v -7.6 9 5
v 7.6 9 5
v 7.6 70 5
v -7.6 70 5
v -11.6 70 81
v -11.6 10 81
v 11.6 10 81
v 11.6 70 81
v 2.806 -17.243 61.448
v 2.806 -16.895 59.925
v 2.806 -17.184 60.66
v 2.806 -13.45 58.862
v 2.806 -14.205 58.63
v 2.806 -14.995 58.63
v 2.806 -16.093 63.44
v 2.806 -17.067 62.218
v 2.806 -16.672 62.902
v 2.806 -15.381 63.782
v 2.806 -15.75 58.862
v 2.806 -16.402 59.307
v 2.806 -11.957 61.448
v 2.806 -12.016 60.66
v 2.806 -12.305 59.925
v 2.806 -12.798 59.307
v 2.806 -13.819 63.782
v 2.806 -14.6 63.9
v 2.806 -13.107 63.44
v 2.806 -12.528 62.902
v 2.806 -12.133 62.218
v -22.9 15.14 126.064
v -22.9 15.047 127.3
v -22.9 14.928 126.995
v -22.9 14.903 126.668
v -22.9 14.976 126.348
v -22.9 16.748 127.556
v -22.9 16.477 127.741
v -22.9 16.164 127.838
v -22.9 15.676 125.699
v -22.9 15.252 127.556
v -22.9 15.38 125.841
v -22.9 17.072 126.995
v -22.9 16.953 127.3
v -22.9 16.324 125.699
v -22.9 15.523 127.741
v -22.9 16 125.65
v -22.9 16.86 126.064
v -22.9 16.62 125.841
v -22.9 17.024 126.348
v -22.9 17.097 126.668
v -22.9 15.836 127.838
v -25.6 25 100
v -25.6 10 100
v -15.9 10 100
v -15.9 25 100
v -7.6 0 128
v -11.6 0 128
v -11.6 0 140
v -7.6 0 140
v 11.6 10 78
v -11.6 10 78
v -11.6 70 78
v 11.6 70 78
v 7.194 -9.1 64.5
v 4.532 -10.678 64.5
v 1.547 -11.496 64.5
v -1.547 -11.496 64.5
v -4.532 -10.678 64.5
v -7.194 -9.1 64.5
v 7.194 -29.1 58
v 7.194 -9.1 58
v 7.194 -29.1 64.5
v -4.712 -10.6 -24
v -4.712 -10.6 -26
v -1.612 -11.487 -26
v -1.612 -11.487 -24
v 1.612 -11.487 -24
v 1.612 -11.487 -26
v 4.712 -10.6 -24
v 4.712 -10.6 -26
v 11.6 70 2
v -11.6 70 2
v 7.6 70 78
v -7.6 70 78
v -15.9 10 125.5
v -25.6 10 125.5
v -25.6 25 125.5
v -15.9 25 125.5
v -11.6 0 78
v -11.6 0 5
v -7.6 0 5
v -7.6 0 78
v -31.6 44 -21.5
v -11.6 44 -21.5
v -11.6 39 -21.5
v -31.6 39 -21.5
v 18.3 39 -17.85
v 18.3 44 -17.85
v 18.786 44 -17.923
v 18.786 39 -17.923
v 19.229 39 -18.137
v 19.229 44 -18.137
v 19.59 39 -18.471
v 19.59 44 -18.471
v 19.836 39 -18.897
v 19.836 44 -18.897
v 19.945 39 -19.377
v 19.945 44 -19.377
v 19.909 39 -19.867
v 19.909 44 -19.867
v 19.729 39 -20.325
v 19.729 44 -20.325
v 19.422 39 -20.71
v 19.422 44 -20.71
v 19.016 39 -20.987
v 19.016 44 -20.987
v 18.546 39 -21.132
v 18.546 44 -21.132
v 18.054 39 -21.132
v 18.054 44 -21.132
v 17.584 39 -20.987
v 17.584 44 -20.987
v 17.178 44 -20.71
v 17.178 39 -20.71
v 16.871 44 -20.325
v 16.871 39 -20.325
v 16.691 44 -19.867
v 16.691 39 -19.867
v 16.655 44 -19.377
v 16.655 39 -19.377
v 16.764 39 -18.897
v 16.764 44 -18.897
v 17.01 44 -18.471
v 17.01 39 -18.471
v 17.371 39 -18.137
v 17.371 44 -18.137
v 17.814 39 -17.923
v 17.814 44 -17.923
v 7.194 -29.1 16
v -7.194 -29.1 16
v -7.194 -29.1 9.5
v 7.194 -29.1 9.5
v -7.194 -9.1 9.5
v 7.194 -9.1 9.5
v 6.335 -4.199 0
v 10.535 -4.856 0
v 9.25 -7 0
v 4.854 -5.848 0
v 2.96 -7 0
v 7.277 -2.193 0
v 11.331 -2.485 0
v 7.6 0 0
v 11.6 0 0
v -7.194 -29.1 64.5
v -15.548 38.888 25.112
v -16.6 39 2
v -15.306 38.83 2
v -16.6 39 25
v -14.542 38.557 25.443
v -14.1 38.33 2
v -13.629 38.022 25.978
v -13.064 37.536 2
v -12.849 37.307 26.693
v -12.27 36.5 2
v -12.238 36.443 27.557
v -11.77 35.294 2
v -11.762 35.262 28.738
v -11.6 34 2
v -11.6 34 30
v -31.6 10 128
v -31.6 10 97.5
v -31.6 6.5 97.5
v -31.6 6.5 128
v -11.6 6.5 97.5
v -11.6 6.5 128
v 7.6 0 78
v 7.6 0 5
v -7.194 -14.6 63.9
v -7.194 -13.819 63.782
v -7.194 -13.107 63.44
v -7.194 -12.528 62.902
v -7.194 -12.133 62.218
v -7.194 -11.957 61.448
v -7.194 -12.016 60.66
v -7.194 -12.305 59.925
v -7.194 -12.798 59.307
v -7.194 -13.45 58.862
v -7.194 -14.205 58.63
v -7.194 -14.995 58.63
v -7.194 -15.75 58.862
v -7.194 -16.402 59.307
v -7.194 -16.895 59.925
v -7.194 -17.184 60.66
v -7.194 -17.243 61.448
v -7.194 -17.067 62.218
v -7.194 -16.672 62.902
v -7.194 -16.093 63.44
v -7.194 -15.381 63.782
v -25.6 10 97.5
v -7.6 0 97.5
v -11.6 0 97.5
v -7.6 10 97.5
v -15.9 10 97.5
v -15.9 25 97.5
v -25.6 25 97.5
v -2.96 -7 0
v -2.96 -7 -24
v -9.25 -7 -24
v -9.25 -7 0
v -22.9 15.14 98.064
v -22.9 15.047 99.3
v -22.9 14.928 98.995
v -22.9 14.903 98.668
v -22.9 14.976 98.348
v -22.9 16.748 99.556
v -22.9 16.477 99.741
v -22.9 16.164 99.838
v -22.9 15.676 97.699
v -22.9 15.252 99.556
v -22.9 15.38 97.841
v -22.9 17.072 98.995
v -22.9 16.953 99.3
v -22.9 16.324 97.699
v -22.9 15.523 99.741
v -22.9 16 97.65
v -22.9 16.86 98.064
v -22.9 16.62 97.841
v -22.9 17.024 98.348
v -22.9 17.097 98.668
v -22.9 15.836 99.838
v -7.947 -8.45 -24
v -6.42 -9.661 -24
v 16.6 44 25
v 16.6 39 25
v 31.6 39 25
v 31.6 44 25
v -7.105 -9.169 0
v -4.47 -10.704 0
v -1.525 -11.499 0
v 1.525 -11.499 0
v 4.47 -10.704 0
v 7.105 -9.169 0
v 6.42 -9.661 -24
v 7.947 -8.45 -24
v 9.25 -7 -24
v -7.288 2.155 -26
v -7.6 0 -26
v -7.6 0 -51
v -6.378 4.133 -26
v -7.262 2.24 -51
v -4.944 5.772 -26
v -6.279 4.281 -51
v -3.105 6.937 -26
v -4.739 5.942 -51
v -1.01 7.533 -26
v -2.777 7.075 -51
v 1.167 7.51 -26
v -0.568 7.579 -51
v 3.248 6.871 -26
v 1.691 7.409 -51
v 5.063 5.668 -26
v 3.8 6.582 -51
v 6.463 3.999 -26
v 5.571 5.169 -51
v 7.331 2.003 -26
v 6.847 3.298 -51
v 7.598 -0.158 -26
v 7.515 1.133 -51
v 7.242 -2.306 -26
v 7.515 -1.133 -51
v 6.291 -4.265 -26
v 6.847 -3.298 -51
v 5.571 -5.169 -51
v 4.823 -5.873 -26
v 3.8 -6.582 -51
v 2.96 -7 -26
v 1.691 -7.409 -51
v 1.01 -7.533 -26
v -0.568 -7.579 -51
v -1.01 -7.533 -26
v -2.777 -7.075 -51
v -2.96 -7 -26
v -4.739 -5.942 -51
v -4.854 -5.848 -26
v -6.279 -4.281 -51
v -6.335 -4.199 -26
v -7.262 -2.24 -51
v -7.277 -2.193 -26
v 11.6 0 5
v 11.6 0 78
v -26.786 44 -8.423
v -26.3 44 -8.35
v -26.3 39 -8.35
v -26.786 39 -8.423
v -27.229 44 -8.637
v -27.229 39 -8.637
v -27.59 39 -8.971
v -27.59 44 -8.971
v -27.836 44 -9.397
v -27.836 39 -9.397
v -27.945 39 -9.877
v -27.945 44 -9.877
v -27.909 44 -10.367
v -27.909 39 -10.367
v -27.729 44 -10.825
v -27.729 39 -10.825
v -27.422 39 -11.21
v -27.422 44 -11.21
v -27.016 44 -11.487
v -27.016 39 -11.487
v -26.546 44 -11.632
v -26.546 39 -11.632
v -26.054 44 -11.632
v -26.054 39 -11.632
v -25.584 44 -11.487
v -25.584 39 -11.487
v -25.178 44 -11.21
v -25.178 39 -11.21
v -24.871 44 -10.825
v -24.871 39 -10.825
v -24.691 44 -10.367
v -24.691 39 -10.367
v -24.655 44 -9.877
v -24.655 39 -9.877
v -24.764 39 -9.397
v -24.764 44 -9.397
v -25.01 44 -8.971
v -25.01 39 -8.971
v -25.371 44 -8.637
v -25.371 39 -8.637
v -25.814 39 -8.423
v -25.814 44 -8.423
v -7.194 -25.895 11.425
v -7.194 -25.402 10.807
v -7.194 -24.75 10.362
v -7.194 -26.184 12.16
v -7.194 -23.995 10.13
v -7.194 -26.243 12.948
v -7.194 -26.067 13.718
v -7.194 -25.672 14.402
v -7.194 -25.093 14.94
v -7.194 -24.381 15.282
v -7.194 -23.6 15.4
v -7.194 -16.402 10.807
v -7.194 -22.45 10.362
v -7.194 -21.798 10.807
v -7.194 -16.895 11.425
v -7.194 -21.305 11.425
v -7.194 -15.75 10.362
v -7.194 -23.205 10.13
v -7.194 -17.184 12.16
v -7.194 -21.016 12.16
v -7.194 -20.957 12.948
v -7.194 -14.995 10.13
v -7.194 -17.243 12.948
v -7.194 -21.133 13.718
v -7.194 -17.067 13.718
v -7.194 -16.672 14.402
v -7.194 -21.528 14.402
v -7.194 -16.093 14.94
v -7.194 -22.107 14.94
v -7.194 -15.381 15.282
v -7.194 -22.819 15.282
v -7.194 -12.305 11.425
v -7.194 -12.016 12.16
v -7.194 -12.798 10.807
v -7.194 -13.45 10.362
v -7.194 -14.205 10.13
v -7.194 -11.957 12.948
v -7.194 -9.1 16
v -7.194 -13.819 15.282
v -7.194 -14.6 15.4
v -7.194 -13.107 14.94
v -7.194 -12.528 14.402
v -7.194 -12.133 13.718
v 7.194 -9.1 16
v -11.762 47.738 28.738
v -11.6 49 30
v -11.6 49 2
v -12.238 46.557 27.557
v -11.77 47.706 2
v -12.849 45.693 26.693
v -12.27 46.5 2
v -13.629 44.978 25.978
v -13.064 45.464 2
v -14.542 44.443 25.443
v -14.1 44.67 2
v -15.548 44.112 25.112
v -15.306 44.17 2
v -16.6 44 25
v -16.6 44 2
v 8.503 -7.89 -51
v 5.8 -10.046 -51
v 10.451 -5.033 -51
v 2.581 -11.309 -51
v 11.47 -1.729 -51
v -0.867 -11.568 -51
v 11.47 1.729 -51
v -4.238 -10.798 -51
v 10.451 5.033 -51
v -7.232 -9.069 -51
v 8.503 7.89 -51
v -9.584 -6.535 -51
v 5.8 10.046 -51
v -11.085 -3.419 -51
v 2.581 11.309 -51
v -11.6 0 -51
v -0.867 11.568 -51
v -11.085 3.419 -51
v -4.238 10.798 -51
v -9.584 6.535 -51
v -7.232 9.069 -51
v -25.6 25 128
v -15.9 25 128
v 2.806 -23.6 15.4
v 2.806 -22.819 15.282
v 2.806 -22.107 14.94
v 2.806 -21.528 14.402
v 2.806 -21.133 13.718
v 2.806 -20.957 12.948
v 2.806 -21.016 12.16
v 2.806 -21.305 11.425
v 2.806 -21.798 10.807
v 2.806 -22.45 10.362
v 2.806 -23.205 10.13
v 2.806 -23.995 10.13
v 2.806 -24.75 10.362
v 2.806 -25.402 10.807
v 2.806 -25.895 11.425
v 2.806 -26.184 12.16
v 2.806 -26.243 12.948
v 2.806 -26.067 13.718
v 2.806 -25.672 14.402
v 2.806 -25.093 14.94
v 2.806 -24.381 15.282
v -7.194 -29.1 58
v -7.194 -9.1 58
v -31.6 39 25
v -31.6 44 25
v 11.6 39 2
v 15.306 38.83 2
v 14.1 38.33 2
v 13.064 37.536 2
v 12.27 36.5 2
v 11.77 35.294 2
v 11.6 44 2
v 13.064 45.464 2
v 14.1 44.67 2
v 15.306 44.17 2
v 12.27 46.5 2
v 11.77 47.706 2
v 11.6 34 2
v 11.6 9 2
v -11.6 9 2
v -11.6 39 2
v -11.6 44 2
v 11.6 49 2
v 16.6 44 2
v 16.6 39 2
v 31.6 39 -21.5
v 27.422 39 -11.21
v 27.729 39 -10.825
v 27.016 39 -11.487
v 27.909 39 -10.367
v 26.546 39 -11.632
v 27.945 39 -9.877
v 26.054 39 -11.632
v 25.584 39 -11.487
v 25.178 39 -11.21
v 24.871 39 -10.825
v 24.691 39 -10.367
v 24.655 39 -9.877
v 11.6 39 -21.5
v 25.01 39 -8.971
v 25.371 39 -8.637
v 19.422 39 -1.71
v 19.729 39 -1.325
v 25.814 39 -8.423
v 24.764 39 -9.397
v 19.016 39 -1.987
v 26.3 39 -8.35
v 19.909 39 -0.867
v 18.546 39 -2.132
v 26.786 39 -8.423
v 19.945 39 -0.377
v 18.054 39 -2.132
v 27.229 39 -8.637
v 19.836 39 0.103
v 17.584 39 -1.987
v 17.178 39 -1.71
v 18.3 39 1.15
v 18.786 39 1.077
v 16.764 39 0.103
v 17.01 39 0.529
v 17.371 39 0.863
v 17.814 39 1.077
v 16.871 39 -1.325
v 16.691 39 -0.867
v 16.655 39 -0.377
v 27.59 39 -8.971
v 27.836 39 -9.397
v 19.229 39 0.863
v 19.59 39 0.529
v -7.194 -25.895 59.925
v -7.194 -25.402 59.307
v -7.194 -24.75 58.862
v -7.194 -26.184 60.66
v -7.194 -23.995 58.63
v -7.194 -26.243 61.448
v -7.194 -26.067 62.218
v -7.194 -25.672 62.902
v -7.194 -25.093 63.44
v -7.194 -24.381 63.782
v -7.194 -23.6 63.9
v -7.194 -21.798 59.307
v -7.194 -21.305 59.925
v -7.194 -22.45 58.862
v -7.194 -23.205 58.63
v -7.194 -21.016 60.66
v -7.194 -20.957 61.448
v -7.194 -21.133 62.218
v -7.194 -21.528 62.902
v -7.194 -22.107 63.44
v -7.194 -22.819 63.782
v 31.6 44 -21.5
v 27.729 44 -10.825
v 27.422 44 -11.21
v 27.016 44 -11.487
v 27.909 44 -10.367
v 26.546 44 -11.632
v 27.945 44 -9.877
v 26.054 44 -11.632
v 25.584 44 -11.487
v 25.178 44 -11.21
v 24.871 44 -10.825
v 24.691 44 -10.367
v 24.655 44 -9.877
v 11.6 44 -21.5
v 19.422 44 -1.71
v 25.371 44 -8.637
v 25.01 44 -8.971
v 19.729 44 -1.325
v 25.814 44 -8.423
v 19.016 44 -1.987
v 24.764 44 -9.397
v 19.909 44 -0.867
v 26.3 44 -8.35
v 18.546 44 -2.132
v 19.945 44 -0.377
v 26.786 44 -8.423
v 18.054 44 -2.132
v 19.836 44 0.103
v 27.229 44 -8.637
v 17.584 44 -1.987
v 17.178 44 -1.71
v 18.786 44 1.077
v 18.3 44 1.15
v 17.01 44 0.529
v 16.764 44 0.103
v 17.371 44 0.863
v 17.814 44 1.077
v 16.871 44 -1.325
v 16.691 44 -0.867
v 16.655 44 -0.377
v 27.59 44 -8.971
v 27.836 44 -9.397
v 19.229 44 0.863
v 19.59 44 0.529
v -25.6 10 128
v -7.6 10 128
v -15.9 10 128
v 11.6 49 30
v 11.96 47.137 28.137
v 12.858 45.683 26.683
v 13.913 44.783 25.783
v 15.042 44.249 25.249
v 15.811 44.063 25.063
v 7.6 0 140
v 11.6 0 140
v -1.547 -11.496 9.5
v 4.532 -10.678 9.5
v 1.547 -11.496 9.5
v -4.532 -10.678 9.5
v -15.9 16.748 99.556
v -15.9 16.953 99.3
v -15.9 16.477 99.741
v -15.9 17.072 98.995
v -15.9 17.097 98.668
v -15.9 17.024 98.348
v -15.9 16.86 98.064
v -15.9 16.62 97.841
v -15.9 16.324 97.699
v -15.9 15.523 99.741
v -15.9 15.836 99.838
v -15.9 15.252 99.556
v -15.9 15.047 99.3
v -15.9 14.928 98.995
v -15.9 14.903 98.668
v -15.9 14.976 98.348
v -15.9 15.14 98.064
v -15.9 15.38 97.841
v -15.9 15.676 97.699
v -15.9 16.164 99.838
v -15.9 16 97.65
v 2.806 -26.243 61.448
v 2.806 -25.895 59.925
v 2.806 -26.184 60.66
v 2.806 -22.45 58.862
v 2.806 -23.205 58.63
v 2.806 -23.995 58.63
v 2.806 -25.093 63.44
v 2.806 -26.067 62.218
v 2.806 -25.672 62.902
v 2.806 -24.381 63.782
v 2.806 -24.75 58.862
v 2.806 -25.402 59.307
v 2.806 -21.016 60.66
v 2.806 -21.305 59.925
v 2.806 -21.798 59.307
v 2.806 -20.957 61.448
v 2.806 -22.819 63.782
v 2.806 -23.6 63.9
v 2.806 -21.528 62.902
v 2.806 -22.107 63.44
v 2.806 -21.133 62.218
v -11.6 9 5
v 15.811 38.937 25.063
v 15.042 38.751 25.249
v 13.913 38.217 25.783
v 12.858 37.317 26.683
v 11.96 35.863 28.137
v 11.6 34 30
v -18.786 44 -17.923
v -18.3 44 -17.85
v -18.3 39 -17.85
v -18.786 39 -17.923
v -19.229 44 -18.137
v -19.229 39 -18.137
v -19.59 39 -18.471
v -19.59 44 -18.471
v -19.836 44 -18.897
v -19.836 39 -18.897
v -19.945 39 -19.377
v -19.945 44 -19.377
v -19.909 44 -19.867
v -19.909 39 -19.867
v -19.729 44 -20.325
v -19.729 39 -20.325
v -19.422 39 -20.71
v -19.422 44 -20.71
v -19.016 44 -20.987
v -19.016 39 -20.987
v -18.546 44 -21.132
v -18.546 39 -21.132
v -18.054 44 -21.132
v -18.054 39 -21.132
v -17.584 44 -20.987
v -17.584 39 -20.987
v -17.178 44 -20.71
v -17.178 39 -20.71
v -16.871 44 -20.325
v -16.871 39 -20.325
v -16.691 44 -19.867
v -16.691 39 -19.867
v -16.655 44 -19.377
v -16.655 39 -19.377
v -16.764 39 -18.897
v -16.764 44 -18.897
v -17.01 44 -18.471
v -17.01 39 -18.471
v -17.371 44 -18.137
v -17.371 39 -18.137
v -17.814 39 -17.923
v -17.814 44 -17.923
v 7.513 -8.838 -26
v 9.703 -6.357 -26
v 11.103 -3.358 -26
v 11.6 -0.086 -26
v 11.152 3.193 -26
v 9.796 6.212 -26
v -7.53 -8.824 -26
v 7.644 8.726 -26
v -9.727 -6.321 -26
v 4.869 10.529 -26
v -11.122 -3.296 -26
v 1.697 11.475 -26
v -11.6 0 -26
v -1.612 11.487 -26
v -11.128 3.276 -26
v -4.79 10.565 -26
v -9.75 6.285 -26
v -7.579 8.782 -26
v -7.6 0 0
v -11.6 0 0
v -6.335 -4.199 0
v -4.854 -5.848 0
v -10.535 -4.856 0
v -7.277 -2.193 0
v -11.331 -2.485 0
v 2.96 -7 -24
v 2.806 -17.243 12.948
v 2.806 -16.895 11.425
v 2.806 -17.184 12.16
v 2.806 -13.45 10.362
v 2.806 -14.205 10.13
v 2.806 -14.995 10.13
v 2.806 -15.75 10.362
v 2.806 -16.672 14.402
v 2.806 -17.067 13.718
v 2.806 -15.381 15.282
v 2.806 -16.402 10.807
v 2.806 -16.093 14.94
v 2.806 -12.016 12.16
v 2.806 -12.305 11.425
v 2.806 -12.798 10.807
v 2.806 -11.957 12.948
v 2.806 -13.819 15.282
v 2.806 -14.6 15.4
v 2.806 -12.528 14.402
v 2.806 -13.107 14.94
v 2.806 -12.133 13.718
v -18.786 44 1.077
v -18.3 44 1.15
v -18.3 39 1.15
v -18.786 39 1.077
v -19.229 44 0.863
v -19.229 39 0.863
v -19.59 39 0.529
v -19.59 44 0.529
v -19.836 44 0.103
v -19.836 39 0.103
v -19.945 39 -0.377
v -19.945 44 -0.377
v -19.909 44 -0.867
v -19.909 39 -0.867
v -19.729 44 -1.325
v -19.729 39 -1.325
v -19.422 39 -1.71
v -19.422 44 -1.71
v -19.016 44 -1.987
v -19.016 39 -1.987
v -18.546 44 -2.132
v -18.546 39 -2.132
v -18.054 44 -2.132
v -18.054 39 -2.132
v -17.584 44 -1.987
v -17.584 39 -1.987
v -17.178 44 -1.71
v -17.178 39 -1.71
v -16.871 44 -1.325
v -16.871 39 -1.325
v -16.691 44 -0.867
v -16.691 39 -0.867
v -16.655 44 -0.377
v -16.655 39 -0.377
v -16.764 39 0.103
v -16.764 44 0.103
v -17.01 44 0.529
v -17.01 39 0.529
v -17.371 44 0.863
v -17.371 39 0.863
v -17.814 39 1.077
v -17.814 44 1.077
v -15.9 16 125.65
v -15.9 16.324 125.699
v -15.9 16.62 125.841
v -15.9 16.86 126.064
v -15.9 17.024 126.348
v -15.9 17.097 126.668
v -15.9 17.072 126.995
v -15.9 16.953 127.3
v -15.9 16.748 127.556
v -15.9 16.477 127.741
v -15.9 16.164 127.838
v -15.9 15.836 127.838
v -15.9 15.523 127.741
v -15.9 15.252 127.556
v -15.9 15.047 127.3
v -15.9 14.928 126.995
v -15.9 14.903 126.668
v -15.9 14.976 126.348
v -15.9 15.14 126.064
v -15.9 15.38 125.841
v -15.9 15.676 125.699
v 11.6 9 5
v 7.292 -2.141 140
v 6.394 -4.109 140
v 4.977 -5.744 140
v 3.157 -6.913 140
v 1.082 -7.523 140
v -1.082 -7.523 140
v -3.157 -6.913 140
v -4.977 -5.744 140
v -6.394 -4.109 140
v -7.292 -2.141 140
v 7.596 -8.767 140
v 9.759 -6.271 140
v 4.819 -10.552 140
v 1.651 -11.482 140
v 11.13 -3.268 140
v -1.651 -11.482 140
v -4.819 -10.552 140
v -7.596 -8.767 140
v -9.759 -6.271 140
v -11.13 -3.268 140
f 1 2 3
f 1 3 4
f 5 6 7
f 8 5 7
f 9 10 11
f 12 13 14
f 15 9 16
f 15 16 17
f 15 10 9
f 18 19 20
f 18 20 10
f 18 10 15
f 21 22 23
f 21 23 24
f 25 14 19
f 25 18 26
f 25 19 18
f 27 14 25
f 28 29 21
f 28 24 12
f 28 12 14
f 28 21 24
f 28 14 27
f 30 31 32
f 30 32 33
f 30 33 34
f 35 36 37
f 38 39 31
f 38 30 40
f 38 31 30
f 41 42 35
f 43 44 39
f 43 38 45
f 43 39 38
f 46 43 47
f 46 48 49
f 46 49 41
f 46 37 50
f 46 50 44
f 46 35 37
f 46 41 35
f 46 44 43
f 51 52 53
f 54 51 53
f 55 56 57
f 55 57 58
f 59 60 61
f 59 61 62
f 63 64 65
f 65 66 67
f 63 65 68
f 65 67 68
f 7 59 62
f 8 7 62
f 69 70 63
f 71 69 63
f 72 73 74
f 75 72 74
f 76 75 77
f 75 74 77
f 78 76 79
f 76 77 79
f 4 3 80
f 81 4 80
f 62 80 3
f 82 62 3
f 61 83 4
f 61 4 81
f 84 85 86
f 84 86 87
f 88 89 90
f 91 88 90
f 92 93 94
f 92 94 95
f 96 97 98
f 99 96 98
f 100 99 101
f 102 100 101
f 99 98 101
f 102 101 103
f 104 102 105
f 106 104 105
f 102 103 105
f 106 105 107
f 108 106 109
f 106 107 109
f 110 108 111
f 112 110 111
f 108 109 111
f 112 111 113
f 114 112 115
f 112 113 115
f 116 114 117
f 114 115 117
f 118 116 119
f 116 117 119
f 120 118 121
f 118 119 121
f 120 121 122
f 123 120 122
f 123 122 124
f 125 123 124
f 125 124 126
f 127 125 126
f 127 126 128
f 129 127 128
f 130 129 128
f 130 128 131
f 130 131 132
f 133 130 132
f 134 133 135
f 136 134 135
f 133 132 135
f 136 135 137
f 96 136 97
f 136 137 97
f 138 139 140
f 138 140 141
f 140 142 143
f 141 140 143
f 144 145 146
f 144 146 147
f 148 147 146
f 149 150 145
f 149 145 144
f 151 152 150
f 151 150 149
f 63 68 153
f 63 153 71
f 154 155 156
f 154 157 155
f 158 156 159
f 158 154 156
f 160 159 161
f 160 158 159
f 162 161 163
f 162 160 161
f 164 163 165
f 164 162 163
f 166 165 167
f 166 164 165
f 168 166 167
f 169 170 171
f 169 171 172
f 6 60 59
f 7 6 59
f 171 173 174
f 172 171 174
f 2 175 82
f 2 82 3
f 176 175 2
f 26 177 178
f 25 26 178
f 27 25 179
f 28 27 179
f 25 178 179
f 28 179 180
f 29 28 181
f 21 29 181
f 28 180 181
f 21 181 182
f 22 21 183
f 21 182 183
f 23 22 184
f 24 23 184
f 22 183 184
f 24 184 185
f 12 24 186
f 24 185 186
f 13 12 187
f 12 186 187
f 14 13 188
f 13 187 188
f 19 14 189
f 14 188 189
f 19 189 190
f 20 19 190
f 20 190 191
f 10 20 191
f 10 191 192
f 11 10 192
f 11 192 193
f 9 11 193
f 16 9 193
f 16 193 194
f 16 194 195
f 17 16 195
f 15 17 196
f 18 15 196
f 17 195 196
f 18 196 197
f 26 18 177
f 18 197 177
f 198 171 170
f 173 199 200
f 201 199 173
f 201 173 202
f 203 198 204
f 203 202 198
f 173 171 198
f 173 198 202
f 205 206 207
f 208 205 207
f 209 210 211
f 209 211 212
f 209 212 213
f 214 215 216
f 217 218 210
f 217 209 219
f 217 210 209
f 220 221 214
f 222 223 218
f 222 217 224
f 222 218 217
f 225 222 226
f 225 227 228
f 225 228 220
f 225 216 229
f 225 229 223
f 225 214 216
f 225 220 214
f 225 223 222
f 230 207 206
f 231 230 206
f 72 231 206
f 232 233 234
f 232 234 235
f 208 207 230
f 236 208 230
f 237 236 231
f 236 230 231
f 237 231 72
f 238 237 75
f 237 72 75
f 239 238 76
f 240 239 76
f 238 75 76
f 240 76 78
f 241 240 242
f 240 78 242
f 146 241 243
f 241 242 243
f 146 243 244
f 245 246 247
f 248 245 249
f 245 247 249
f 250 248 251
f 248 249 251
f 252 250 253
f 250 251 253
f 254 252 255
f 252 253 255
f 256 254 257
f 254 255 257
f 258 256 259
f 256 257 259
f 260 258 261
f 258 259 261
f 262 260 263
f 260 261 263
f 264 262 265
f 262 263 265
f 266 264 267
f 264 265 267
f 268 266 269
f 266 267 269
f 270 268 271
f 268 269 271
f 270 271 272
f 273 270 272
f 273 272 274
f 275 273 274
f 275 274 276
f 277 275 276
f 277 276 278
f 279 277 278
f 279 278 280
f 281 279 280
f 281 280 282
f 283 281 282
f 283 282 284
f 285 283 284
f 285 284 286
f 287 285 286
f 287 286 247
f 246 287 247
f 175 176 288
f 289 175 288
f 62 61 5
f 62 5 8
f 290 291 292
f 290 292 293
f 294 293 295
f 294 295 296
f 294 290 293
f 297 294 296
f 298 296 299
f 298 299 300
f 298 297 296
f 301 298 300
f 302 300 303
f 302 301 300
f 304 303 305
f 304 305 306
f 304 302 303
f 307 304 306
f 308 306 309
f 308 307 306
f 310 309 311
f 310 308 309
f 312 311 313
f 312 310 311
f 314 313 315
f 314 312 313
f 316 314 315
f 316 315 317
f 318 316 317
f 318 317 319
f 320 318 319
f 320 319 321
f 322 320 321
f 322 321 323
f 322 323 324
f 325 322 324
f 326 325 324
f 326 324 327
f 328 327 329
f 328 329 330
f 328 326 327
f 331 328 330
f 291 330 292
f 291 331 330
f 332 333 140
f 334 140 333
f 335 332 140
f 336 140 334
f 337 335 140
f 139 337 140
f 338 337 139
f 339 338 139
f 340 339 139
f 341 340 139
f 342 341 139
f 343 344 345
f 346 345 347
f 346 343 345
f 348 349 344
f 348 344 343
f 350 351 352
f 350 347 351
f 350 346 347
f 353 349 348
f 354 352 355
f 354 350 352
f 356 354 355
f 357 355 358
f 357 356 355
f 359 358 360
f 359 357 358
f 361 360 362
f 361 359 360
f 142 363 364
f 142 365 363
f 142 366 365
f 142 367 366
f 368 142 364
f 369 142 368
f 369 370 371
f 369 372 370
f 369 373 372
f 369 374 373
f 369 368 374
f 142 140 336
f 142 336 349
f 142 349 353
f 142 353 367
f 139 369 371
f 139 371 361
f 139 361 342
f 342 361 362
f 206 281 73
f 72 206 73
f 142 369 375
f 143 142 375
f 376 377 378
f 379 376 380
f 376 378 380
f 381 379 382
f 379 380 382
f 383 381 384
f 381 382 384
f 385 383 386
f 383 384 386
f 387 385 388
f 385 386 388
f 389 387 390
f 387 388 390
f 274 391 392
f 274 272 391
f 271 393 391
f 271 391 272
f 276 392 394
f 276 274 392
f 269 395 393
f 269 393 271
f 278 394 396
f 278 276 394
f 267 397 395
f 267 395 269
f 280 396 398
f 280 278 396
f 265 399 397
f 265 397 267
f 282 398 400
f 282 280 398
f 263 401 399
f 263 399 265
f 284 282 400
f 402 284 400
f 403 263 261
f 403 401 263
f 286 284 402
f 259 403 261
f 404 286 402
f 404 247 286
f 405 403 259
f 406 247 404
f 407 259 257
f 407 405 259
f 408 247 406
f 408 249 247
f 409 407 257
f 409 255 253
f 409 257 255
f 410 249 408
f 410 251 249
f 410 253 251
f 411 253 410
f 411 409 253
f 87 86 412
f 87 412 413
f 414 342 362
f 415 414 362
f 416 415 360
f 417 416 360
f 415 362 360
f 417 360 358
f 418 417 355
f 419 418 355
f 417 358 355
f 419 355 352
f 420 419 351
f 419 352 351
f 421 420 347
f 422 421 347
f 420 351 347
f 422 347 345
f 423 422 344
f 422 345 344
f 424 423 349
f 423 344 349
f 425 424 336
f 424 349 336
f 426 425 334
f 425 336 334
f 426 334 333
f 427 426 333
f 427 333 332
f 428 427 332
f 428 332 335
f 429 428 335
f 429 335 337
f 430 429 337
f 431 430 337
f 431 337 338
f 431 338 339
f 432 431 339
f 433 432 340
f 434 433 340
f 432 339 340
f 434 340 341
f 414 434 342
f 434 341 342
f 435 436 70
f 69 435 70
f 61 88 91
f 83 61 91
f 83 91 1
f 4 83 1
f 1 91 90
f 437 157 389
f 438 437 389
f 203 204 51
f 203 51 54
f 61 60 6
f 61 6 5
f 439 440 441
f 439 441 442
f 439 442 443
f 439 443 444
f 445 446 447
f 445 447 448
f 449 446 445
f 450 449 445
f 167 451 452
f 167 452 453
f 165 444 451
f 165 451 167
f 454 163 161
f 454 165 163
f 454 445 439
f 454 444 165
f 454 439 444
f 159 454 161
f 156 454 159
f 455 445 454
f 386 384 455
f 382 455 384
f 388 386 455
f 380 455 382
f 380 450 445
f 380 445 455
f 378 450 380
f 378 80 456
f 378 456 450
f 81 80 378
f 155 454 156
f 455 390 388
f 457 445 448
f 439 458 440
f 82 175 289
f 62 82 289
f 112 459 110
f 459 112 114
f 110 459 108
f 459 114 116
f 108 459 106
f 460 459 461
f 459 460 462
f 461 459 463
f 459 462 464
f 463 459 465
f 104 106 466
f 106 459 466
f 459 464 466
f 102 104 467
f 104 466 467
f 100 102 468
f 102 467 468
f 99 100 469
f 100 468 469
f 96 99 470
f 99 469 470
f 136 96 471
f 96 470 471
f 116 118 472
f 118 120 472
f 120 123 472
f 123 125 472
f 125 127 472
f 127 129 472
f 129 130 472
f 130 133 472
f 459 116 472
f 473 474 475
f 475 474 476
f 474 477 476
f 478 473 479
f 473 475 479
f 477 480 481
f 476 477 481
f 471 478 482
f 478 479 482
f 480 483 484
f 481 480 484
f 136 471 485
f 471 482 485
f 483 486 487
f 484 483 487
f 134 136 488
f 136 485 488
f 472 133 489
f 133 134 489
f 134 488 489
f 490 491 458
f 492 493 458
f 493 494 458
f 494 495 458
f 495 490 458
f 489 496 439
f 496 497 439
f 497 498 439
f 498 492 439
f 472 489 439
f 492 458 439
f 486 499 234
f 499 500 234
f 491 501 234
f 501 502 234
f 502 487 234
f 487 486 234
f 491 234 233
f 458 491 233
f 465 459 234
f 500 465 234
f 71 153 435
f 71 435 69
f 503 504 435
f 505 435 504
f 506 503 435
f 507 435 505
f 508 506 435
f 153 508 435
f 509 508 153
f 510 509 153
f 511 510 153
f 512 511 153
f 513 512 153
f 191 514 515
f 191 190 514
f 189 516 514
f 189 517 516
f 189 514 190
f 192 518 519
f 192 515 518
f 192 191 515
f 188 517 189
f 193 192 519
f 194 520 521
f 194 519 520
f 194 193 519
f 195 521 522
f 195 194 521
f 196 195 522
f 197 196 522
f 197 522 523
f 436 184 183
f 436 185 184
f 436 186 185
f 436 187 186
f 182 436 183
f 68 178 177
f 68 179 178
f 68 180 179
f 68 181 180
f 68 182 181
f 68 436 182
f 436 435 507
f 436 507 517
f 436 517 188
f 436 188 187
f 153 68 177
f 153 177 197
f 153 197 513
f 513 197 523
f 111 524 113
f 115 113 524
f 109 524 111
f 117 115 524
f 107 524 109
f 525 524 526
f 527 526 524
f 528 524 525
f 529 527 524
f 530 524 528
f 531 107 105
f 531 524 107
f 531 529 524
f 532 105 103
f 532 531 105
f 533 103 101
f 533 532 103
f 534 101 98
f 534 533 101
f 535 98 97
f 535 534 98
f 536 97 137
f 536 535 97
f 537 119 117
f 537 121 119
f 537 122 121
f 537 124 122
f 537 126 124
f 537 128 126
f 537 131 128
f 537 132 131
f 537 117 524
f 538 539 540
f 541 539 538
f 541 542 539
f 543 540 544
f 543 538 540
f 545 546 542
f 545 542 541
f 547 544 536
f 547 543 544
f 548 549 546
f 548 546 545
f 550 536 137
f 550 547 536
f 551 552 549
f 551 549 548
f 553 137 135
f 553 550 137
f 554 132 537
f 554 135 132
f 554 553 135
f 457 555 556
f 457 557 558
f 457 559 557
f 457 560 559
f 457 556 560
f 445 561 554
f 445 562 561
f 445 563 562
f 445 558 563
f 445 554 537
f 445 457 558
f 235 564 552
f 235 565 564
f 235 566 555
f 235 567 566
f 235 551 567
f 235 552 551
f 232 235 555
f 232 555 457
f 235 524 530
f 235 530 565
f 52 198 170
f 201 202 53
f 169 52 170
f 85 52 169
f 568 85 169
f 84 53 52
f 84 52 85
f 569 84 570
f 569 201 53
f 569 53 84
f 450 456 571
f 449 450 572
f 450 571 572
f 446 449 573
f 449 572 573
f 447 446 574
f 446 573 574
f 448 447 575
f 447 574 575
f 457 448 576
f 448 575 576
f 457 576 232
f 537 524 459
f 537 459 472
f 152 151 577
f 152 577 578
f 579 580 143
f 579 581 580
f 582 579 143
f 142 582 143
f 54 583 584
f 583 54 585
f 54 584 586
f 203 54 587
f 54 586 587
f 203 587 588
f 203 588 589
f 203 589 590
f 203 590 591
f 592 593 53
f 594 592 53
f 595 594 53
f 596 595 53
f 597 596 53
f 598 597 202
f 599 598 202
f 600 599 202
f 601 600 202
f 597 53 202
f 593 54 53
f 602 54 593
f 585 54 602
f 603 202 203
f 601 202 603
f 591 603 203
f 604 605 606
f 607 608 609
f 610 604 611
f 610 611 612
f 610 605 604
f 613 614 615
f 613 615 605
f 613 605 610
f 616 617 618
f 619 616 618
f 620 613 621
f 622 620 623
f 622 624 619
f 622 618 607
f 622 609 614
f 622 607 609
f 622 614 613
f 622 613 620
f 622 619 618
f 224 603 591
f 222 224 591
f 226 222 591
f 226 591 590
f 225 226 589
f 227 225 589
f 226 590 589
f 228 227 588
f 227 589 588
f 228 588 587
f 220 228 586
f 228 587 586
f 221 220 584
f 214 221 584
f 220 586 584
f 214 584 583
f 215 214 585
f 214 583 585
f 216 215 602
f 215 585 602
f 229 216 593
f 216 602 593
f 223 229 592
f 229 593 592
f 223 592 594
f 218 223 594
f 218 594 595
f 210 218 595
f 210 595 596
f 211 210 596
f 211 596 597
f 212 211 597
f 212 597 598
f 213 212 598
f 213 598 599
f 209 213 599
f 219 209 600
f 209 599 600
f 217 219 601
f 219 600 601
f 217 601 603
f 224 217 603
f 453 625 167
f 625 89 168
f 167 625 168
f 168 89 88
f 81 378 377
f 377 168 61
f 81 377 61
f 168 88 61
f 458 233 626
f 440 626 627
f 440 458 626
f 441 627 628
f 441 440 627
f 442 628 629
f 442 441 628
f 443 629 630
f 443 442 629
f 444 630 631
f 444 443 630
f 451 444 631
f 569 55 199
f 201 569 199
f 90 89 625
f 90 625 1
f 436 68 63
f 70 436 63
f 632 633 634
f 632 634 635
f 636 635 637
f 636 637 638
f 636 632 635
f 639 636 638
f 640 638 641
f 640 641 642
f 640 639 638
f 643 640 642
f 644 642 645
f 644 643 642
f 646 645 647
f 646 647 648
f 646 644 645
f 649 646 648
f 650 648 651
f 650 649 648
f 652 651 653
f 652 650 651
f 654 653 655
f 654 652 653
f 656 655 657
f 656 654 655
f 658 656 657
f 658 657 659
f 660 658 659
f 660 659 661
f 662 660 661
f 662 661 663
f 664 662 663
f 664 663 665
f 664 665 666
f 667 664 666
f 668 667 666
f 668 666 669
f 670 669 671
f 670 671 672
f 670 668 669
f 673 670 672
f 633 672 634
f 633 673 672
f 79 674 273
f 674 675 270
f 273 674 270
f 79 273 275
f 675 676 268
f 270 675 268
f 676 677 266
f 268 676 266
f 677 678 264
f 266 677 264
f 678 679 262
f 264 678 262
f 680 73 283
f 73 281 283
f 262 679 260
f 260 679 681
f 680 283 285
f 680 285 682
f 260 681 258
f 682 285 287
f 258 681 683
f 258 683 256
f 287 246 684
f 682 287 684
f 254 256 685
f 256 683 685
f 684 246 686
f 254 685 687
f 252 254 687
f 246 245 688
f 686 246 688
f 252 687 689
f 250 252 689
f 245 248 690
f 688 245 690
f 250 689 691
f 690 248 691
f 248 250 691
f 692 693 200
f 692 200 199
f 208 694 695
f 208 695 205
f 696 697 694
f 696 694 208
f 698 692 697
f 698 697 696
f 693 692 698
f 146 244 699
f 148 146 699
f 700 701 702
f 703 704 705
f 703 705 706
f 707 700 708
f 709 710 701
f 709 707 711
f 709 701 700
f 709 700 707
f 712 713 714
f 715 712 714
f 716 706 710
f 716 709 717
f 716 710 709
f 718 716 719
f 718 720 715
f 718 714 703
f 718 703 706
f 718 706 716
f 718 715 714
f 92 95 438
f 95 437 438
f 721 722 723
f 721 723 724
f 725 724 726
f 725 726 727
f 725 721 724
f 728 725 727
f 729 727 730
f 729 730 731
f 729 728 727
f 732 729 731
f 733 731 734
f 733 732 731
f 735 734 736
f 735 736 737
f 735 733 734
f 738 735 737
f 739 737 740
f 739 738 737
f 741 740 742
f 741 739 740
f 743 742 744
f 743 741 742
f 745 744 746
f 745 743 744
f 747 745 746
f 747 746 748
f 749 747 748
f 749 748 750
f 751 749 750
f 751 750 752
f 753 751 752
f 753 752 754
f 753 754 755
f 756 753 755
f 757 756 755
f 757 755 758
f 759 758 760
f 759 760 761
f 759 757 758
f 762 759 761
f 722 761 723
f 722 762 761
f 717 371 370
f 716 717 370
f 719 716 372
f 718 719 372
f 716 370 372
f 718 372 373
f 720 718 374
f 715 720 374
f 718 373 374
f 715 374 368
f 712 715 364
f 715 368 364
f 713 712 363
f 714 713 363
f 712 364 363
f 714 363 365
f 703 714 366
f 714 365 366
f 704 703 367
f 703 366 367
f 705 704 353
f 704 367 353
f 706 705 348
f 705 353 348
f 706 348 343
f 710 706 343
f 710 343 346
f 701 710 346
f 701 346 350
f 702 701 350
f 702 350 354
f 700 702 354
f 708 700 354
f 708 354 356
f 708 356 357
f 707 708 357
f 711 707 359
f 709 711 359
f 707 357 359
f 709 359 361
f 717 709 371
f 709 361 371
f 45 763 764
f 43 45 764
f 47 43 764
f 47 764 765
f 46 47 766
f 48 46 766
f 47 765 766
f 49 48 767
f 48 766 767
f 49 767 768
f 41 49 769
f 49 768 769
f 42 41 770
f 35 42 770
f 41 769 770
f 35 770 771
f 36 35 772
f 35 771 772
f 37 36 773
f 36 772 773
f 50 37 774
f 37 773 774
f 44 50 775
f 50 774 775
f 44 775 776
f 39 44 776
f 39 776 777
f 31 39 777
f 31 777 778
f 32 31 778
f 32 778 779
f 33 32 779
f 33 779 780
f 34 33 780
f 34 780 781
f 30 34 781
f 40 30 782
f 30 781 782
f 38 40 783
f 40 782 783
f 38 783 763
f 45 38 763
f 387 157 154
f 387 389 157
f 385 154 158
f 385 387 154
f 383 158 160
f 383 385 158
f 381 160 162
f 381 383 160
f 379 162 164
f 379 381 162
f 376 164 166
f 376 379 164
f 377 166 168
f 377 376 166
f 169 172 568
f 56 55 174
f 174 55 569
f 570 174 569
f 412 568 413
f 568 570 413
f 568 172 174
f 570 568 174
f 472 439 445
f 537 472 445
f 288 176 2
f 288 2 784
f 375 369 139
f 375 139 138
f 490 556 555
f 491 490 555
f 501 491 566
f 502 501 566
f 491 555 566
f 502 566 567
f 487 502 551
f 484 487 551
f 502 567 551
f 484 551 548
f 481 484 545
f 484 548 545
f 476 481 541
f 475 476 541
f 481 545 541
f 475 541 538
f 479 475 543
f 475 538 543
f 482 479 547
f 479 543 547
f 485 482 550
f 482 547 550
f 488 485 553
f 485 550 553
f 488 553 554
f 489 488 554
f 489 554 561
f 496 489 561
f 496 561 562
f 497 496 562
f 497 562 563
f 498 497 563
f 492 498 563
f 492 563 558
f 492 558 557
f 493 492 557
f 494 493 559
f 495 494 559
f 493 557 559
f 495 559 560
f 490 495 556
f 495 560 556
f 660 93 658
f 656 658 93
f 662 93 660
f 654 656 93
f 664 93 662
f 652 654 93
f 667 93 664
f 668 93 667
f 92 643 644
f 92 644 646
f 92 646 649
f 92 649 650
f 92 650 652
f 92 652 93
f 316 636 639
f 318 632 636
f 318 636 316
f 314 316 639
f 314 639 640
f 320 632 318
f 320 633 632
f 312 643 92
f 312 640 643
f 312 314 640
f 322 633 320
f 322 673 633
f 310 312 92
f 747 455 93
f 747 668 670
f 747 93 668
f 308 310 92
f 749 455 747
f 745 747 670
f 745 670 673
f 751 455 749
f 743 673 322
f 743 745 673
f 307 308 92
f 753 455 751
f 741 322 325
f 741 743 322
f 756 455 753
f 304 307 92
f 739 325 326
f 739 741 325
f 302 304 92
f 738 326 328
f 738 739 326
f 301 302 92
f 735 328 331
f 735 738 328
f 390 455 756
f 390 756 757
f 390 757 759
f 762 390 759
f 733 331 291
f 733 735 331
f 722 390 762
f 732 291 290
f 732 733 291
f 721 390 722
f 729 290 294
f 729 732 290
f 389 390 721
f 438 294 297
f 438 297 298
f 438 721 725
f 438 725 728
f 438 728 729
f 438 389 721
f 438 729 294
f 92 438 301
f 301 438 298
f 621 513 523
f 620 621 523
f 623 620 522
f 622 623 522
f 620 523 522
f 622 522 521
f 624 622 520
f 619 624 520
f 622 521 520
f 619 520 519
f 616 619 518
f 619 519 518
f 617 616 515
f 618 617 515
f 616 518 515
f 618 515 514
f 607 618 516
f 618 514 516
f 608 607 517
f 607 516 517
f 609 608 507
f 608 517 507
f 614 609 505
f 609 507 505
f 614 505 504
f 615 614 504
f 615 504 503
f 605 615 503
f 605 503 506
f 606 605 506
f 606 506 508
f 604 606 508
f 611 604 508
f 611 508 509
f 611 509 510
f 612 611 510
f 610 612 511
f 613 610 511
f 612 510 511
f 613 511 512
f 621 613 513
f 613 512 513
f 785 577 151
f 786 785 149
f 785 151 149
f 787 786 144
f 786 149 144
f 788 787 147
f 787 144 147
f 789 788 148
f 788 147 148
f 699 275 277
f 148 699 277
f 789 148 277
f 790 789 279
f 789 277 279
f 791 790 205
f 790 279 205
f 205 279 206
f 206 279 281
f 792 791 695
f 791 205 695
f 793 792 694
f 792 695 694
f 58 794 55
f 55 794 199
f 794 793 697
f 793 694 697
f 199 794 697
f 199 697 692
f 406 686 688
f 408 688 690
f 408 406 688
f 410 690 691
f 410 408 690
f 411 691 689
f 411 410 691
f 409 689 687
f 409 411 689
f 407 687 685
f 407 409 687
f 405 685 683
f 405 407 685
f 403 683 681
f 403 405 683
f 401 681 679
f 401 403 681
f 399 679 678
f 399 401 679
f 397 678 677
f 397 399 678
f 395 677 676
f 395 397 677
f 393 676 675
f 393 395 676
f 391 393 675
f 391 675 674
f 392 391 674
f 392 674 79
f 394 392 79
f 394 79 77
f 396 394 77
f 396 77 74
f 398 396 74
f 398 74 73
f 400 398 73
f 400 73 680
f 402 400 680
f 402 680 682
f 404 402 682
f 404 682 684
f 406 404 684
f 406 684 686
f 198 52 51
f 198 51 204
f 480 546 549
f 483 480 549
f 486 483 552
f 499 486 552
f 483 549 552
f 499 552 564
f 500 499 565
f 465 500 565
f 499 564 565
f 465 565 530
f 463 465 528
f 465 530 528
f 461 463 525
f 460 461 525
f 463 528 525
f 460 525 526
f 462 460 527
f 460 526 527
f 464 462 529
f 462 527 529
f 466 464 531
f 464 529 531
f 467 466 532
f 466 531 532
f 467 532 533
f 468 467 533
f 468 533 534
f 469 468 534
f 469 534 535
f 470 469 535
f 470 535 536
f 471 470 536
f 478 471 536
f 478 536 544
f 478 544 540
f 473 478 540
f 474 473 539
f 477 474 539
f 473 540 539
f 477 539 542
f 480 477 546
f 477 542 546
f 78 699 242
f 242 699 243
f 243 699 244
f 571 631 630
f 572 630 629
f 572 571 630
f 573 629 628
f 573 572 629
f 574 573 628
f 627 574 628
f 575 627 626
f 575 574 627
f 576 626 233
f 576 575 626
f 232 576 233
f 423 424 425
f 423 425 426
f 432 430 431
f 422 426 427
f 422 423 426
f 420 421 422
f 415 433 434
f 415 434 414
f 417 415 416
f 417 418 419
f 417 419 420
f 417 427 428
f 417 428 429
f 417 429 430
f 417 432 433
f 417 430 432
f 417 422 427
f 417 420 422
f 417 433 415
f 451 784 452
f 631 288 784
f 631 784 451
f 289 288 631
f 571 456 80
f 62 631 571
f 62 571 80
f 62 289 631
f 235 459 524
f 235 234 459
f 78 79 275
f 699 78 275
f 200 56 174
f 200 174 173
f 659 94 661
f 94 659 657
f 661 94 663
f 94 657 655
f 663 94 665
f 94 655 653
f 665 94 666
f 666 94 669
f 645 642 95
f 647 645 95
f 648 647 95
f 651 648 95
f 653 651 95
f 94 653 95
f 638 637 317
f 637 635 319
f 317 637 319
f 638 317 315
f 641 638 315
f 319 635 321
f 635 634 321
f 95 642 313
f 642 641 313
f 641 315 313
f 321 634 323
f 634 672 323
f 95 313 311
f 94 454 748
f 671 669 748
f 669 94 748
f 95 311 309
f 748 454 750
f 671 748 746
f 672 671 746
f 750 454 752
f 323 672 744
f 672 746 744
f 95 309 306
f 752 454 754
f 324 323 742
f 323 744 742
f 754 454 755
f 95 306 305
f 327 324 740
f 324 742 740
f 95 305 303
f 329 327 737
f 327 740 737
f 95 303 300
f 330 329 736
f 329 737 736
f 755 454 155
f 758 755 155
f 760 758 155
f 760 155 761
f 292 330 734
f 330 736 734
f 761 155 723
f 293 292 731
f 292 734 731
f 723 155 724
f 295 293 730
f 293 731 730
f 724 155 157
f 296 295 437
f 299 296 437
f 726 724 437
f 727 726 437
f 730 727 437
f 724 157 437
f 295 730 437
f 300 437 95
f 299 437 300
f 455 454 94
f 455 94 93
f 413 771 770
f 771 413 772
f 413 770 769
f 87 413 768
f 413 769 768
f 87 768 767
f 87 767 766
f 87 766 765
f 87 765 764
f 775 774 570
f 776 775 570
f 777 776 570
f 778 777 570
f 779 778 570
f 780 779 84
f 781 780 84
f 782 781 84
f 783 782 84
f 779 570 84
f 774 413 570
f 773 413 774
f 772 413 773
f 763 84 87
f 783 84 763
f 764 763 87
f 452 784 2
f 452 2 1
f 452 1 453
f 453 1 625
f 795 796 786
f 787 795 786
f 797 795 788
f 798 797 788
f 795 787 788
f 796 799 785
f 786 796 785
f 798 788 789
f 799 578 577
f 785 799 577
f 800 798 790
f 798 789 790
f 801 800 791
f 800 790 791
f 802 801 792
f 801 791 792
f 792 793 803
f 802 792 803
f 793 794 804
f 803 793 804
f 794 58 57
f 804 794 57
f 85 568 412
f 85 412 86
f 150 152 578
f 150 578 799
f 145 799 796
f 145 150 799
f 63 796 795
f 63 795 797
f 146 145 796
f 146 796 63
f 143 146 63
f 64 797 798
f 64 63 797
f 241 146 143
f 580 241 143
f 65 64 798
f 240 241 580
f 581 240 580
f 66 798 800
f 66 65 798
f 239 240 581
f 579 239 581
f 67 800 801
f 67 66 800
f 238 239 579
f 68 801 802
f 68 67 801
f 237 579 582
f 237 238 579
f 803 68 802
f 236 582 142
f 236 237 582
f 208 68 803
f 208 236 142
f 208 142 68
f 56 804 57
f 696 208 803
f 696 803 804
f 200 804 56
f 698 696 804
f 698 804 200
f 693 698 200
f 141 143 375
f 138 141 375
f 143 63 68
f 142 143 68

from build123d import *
from build123d.topology import SkipClean

# Parameters (mm, degrees)
BOSS_EXTRUDE1_DEPTH    = 140
SKETCH2_W              = 4
SKETCH2_H              = 73
BOSS_EXTRUDE2_DEPTH    = 70
BOSS_EXTRUDE2_2_DEPTH  = 70
SKETCH5_W              = 23.2
SKETCH5_H              = 61
BOSS_EXTRUDE3_DEPTH    = 3
SKETCH6_W              = 23.2
SKETCH6_H              = 60
BOSS_EXTRUDE4_DEPTH    = 3
SKETCH7_W              = 4
SKETCH7_H              = 30.5
BOSS_EXTRUDE5_DEPTH    = 10
SKETCH8_W              = 30.5
SKETCH8_H              = 3.5
BOSS_EXTRUDE6_DEPTH    = 20
SKETCH10_W             = 9.7
SKETCH10_H             = 2.5
BOSS_EXTRUDE7_DEPTH    = 15
SKETCH11_R             = 1.1
CUT_EXTRUDE1_DEPTH     = 7
BOSS_EXTRUDE8_START    = 24
BOSS_EXTRUDE8_DEPTH    = 24
SKETCH28_W             = 20
SKETCH28_H             = 5
BOSS_EXTRUDE17_DEPTH   = 20
SKETCH29_W             = 20
SKETCH29_H             = 5
BOSS_EXTRUDE18_DEPTH   = 26.5
FILLET1_R              = 5
SKETCH33_W             = 20
SKETCH33_H             = 5
BOSS_EXTRUDE19_DEPTH   = 20
SKETCH34_W             = 20
SKETCH34_H             = 5
BOSS_EXTRUDE20_DEPTH   = 26.5
FILLET3_R              = 5
SKETCH32_W             = 20
SKETCH32_H             = 55
CUT_EXTRUDE4_DEPTH     = 2.5
SKETCH35_W             = 14.38749457
SKETCH35_H             = 6.5
BOSS_EXTRUDE21_DEPTH   = 20
BOSS_EXTRUDE21_2_DEPTH = 20
SKETCH38_R             = 2.65
CUT_EXTRUDE6_DEPTH     = 10
SKETCH39_R             = 2.65
CUT_EXTRUDE7_DEPTH     = 10
SKETCH43_R             = 1.65
CUT_EXTRUDE8_DEPTH     = 5
BOSS_EXTRUDE22_START   = 2
BOSS_EXTRUDE22_DEPTH   = 2
BOSS_EXTRUDE23_START   = 25
SKETCH44_R             = 11.6
SKETCH44_R_2           = 7.6
BOSS_EXTRUDE23_DEPTH   = 25


with BuildPart() as part:
    # Sketch1 → Boss-Extrude1 (new body)
    with BuildSketch(Plane.XY):
        with BuildLine():
            Line((-11.6, 0), (-7.6, 0))
            ThreePointArc((-7.6, 0), (0, -7.6), (7.6, 0))
            Line((7.6, 0), (11.6, 0))
            ThreePointArc((11.6, 0), (0, -11.6), (-11.6, 0))
        make_face()
    extrude(amount=BOSS_EXTRUDE1_DEPTH)

    # Sketch7 → Boss-Extrude5 (add)
    with BuildSketch(Plane(origin=(0, 0, 0), x_dir=(1, 0, 0), z_dir=(0, 1, 0))):
        with Locations((-9.6, -112.75)):
            Rectangle(SKETCH7_W, SKETCH7_H)
    extrude(amount=BOSS_EXTRUDE5_DEPTH)

    # Sketch8 → Boss-Extrude6 (add)
    with BuildSketch(Plane.ZY.offset(11.6)):
        with Locations((112.75, 8.25)):
            Rectangle(SKETCH8_W, SKETCH8_H)
    extrude(amount=BOSS_EXTRUDE6_DEPTH)

    # Sketch10 → Boss-Extrude7 (add)
    with BuildSketch(Plane(origin=(0, 10, 0), x_dir=(1, 0, 0), z_dir=(0, 1, 0))):
        with Locations((-20.75, -126.75)):
            Rectangle(SKETCH10_W, SKETCH10_H)
        with Locations((-20.75, -98.75)):
            Rectangle(SKETCH10_W, SKETCH10_H)
    extrude(amount=BOSS_EXTRUDE7_DEPTH)

    # Sketch11 → Cut-Extrude1 (cut)
    with BuildSketch(Plane(origin=(-15.9, 0, 0), x_dir=(0, 0, -1), z_dir=(1, 0, 0))):
        with Locations((-98.75, 16)):
            Circle(SKETCH11_R)
        with Locations((-126.75, 16)):
            Circle(SKETCH11_R)
    extrude(amount=-CUT_EXTRUDE1_DEPTH, mode=Mode.SUBTRACT)

    # Sketch12 → Boss-Extrude8 (add)
    with BuildSketch(Plane(origin=(0, 0, 0), x_dir=(-1, 0, 0), z_dir=(0, 0, -1)).offset(BOSS_EXTRUDE8_START)):
        with BuildLine():
            Line((-9.249864864, -7), (-2.959729717, -7))
            ThreePointArc((-2.959729717, -7), (0, -7.6), (2.959729717, -7))
            Line((2.959729717, -7), (9.249864864, -7))
            ThreePointArc((9.249864864, -7), (0, -11.6), (-9.249864864, -7))
        make_face()
    extrude(amount=-BOSS_EXTRUDE8_DEPTH)

    # Sketch32 → Cut-Extrude4 (cut)
    with BuildSketch(Plane(origin=(0, -11.6, 0), x_dir=(-1, 0, 0), z_dir=(0, -1, 0))):
        with Locations((0, -37)):
            Rectangle(SKETCH32_W, SKETCH32_H)
    extrude(amount=-CUT_EXTRUDE4_DEPTH, mode=Mode.SUBTRACT)

    # Sketch41 → Boss-Extrude22 (add)
    with BuildSketch(Plane(origin=(0, 0, -24), x_dir=(-1, 0, 0), z_dir=(0, 0, -1)).offset(BOSS_EXTRUDE22_START)):
        with BuildLine():
            Line((-4.711687596, -10.6), (-2.959729717, -7))
            ThreePointArc((-2.959729717, -7), (0, -7.6), (2.959729717, -7))
            Line((2.959729717, -7), (4.711687596, -10.6))
            ThreePointArc((4.711687596, -10.6), (0, -11.6), (-4.711687596, -10.6))
        make_face()
    extrude(amount=-BOSS_EXTRUDE22_DEPTH)

    # Sketch44 → Boss-Extrude23 (add)
    with SkipClean():  # the faces are left unmerged after this step: merging them gives an invalid solid
        with BuildSketch(Plane(origin=(0, 0, -26), x_dir=(-1, 0, 0), z_dir=(0, 0, -1)).offset(BOSS_EXTRUDE23_START)):
            Circle(SKETCH44_R)
            Circle(SKETCH44_R_2, mode=Mode.SUBTRACT)
        extrude(amount=-BOSS_EXTRUDE23_DEPTH)


with BuildPart() as body_2:
    # Sketch2 → Boss-Extrude2 (new body)
    with BuildSketch(Plane(origin=(0, 0, 0), x_dir=(1, 0, 0), z_dir=(0, 1, 0))):
        with Locations((-9.6, -41.5)):
            Rectangle(SKETCH2_W, SKETCH2_H)
    extrude(amount=BOSS_EXTRUDE2_DEPTH)



with BuildPart() as body_3:
    # Sketch2 → Boss-Extrude2 2 (new body)
    with BuildSketch(Plane(origin=(0, 0, 0), x_dir=(1, 0, 0), z_dir=(0, 1, 0))):
        with Locations((9.6, -41.5)):
            Rectangle(SKETCH2_W, SKETCH2_H)
    extrude(amount=BOSS_EXTRUDE2_2_DEPTH)



with BuildPart() as body_4:
    # Sketch5 → Boss-Extrude3 (new body)
    with BuildSketch(Plane(origin=(0, 0, 5), x_dir=(-1, 0, 0), z_dir=(0, 0, -1))):
        with Locations((0, 39.5)):
            Rectangle(SKETCH5_W, SKETCH5_H)
    extrude(amount=BOSS_EXTRUDE3_DEPTH)


with BuildPart() as body_5:
    # Sketch6 → Boss-Extrude4 (new body)
    with BuildSketch(Plane.XY.offset(78)):
        with Locations((0, 40)):
            Rectangle(SKETCH6_W, SKETCH6_H)
    extrude(amount=BOSS_EXTRUDE4_DEPTH)


with BuildPart() as body_3_1:
    add(body_3.part)

    add(body_4.part)  # Boss-Extrude17 merges body 4
    # Sketch28 → Boss-Extrude17 (add)
    with BuildSketch(Plane(origin=(11.6, 0, 0), x_dir=(0, 0, -1), z_dir=(1, 0, 0))):
        with Locations((-15, 41.5)):
            Rectangle(SKETCH28_W, SKETCH28_H)
    extrude(amount=BOSS_EXTRUDE17_DEPTH)

    # Sketch29 → Boss-Extrude18 (add)
    with BuildSketch(Plane(origin=(0, 0, 5), x_dir=(-1, 0, 0), z_dir=(0, 0, -1))):
        with Locations((-21.6, 41.5)):
            Rectangle(SKETCH29_W, SKETCH29_H)
    extrude(amount=BOSS_EXTRUDE18_DEPTH)

    # Fillet1
    fillet1_edges = [body_3_1.edges().sort_by_distance(p)[0] for p in [
        (11.6, 44, 13.5),
        (11.6, 41.5, 25),
        (11.6, 39, 13.5),
    ]]
    fillet(fillet1_edges, radius=FILLET1_R)


with BuildPart() as body_2_1:
    add(body_2.part)

    add(body_3_1.part)  # Boss-Extrude19 merges body 3
    # Sketch33 → Boss-Extrude19 (add)
    with BuildSketch(Plane.ZY.offset(11.6)):
        with Locations((15, 41.5)):
            Rectangle(SKETCH33_W, SKETCH33_H)
    extrude(amount=BOSS_EXTRUDE19_DEPTH)

    # Sketch34 → Boss-Extrude20 (add)
    with BuildSketch(Plane(origin=(0, 0, 5), x_dir=(-1, 0, 0), z_dir=(0, 0, -1))):
        with Locations((21.6, 41.5)):
            Rectangle(SKETCH34_W, SKETCH34_H)
    extrude(amount=BOSS_EXTRUDE20_DEPTH)

    # Fillet3
    fillet3_edges = [body_2_1.edges().sort_by_distance(p)[0] for p in [
        (-11.6, 39, 13.5),
        (-11.6, 41.5, 25),
        (-11.6, 44, 13.5),
    ]]
    fillet(fillet3_edges, radius=FILLET3_R)

    # Sketch43 → Cut-Extrude8 (cut)
    with BuildSketch(Plane(origin=(0, 44, 0), x_dir=(1, 0, 0), z_dir=(0, 1, 0))):
        with Locations(Location((18.3, 19.5, 0), (0, 0, 270))):
            Circle(SKETCH43_R)
        with Locations(Location((18.3, 0.5, 0), (0, 0, 270))):
            Circle(SKETCH43_R)
        with Locations(Location((26.3, 10, 0), (0, 0, 270))):
            Circle(SKETCH43_R)
    cut_extrude8 = extrude(amount=-CUT_EXTRUDE8_DEPTH, mode=Mode.SUBTRACT)

    # Mirror1: Cut-Extrude8 across plane
    add(cut_extrude8.mirror(Plane(origin=(0, 0, 0), x_dir=(0, 0, 1), z_dir=(1, 0, 0))), mode=Mode.SUBTRACT)


with BuildPart() as body_4_2:
    # Sketch35 → Boss-Extrude21 (new body)
    with BuildSketch(Plane.XZ.offset(9.1)):
        with Locations((0, 61.25)):
            Rectangle(SKETCH35_W, SKETCH35_H)
    extrude(amount=BOSS_EXTRUDE21_DEPTH)

    # Sketch39 → Cut-Extrude7 (cut)
    with BuildSketch(Plane.ZY.offset(7.193747285)):
        with Locations((61.25, -14.6)):
            Circle(SKETCH39_R)
        with Locations((61.25, -23.6)):
            Circle(SKETCH39_R)
    extrude(amount=-CUT_EXTRUDE7_DEPTH, mode=Mode.SUBTRACT)


with BuildPart() as body_5_2:
    # Sketch35 → Boss-Extrude21 2 (new body)
    with BuildSketch(Plane.XZ.offset(9.1)):
        with Locations((0, 12.75)):
            Rectangle(SKETCH35_W, SKETCH35_H)
    extrude(amount=BOSS_EXTRUDE21_2_DEPTH)

    # Sketch38 → Cut-Extrude6 (cut)
    with BuildSketch(Plane.ZY.offset(7.193747285)):
        with Locations((12.75, -14.6)):
            Circle(SKETCH38_R)
        with Locations((12.75, -23.6)):
            Circle(SKETCH38_R)
    extrude(amount=-CUT_EXTRUDE6_DEPTH, mode=Mode.SUBTRACT)


solid = Compound([part.part, body_5.part, body_2_1.part, body_4_2.part, body_5_2.part])
